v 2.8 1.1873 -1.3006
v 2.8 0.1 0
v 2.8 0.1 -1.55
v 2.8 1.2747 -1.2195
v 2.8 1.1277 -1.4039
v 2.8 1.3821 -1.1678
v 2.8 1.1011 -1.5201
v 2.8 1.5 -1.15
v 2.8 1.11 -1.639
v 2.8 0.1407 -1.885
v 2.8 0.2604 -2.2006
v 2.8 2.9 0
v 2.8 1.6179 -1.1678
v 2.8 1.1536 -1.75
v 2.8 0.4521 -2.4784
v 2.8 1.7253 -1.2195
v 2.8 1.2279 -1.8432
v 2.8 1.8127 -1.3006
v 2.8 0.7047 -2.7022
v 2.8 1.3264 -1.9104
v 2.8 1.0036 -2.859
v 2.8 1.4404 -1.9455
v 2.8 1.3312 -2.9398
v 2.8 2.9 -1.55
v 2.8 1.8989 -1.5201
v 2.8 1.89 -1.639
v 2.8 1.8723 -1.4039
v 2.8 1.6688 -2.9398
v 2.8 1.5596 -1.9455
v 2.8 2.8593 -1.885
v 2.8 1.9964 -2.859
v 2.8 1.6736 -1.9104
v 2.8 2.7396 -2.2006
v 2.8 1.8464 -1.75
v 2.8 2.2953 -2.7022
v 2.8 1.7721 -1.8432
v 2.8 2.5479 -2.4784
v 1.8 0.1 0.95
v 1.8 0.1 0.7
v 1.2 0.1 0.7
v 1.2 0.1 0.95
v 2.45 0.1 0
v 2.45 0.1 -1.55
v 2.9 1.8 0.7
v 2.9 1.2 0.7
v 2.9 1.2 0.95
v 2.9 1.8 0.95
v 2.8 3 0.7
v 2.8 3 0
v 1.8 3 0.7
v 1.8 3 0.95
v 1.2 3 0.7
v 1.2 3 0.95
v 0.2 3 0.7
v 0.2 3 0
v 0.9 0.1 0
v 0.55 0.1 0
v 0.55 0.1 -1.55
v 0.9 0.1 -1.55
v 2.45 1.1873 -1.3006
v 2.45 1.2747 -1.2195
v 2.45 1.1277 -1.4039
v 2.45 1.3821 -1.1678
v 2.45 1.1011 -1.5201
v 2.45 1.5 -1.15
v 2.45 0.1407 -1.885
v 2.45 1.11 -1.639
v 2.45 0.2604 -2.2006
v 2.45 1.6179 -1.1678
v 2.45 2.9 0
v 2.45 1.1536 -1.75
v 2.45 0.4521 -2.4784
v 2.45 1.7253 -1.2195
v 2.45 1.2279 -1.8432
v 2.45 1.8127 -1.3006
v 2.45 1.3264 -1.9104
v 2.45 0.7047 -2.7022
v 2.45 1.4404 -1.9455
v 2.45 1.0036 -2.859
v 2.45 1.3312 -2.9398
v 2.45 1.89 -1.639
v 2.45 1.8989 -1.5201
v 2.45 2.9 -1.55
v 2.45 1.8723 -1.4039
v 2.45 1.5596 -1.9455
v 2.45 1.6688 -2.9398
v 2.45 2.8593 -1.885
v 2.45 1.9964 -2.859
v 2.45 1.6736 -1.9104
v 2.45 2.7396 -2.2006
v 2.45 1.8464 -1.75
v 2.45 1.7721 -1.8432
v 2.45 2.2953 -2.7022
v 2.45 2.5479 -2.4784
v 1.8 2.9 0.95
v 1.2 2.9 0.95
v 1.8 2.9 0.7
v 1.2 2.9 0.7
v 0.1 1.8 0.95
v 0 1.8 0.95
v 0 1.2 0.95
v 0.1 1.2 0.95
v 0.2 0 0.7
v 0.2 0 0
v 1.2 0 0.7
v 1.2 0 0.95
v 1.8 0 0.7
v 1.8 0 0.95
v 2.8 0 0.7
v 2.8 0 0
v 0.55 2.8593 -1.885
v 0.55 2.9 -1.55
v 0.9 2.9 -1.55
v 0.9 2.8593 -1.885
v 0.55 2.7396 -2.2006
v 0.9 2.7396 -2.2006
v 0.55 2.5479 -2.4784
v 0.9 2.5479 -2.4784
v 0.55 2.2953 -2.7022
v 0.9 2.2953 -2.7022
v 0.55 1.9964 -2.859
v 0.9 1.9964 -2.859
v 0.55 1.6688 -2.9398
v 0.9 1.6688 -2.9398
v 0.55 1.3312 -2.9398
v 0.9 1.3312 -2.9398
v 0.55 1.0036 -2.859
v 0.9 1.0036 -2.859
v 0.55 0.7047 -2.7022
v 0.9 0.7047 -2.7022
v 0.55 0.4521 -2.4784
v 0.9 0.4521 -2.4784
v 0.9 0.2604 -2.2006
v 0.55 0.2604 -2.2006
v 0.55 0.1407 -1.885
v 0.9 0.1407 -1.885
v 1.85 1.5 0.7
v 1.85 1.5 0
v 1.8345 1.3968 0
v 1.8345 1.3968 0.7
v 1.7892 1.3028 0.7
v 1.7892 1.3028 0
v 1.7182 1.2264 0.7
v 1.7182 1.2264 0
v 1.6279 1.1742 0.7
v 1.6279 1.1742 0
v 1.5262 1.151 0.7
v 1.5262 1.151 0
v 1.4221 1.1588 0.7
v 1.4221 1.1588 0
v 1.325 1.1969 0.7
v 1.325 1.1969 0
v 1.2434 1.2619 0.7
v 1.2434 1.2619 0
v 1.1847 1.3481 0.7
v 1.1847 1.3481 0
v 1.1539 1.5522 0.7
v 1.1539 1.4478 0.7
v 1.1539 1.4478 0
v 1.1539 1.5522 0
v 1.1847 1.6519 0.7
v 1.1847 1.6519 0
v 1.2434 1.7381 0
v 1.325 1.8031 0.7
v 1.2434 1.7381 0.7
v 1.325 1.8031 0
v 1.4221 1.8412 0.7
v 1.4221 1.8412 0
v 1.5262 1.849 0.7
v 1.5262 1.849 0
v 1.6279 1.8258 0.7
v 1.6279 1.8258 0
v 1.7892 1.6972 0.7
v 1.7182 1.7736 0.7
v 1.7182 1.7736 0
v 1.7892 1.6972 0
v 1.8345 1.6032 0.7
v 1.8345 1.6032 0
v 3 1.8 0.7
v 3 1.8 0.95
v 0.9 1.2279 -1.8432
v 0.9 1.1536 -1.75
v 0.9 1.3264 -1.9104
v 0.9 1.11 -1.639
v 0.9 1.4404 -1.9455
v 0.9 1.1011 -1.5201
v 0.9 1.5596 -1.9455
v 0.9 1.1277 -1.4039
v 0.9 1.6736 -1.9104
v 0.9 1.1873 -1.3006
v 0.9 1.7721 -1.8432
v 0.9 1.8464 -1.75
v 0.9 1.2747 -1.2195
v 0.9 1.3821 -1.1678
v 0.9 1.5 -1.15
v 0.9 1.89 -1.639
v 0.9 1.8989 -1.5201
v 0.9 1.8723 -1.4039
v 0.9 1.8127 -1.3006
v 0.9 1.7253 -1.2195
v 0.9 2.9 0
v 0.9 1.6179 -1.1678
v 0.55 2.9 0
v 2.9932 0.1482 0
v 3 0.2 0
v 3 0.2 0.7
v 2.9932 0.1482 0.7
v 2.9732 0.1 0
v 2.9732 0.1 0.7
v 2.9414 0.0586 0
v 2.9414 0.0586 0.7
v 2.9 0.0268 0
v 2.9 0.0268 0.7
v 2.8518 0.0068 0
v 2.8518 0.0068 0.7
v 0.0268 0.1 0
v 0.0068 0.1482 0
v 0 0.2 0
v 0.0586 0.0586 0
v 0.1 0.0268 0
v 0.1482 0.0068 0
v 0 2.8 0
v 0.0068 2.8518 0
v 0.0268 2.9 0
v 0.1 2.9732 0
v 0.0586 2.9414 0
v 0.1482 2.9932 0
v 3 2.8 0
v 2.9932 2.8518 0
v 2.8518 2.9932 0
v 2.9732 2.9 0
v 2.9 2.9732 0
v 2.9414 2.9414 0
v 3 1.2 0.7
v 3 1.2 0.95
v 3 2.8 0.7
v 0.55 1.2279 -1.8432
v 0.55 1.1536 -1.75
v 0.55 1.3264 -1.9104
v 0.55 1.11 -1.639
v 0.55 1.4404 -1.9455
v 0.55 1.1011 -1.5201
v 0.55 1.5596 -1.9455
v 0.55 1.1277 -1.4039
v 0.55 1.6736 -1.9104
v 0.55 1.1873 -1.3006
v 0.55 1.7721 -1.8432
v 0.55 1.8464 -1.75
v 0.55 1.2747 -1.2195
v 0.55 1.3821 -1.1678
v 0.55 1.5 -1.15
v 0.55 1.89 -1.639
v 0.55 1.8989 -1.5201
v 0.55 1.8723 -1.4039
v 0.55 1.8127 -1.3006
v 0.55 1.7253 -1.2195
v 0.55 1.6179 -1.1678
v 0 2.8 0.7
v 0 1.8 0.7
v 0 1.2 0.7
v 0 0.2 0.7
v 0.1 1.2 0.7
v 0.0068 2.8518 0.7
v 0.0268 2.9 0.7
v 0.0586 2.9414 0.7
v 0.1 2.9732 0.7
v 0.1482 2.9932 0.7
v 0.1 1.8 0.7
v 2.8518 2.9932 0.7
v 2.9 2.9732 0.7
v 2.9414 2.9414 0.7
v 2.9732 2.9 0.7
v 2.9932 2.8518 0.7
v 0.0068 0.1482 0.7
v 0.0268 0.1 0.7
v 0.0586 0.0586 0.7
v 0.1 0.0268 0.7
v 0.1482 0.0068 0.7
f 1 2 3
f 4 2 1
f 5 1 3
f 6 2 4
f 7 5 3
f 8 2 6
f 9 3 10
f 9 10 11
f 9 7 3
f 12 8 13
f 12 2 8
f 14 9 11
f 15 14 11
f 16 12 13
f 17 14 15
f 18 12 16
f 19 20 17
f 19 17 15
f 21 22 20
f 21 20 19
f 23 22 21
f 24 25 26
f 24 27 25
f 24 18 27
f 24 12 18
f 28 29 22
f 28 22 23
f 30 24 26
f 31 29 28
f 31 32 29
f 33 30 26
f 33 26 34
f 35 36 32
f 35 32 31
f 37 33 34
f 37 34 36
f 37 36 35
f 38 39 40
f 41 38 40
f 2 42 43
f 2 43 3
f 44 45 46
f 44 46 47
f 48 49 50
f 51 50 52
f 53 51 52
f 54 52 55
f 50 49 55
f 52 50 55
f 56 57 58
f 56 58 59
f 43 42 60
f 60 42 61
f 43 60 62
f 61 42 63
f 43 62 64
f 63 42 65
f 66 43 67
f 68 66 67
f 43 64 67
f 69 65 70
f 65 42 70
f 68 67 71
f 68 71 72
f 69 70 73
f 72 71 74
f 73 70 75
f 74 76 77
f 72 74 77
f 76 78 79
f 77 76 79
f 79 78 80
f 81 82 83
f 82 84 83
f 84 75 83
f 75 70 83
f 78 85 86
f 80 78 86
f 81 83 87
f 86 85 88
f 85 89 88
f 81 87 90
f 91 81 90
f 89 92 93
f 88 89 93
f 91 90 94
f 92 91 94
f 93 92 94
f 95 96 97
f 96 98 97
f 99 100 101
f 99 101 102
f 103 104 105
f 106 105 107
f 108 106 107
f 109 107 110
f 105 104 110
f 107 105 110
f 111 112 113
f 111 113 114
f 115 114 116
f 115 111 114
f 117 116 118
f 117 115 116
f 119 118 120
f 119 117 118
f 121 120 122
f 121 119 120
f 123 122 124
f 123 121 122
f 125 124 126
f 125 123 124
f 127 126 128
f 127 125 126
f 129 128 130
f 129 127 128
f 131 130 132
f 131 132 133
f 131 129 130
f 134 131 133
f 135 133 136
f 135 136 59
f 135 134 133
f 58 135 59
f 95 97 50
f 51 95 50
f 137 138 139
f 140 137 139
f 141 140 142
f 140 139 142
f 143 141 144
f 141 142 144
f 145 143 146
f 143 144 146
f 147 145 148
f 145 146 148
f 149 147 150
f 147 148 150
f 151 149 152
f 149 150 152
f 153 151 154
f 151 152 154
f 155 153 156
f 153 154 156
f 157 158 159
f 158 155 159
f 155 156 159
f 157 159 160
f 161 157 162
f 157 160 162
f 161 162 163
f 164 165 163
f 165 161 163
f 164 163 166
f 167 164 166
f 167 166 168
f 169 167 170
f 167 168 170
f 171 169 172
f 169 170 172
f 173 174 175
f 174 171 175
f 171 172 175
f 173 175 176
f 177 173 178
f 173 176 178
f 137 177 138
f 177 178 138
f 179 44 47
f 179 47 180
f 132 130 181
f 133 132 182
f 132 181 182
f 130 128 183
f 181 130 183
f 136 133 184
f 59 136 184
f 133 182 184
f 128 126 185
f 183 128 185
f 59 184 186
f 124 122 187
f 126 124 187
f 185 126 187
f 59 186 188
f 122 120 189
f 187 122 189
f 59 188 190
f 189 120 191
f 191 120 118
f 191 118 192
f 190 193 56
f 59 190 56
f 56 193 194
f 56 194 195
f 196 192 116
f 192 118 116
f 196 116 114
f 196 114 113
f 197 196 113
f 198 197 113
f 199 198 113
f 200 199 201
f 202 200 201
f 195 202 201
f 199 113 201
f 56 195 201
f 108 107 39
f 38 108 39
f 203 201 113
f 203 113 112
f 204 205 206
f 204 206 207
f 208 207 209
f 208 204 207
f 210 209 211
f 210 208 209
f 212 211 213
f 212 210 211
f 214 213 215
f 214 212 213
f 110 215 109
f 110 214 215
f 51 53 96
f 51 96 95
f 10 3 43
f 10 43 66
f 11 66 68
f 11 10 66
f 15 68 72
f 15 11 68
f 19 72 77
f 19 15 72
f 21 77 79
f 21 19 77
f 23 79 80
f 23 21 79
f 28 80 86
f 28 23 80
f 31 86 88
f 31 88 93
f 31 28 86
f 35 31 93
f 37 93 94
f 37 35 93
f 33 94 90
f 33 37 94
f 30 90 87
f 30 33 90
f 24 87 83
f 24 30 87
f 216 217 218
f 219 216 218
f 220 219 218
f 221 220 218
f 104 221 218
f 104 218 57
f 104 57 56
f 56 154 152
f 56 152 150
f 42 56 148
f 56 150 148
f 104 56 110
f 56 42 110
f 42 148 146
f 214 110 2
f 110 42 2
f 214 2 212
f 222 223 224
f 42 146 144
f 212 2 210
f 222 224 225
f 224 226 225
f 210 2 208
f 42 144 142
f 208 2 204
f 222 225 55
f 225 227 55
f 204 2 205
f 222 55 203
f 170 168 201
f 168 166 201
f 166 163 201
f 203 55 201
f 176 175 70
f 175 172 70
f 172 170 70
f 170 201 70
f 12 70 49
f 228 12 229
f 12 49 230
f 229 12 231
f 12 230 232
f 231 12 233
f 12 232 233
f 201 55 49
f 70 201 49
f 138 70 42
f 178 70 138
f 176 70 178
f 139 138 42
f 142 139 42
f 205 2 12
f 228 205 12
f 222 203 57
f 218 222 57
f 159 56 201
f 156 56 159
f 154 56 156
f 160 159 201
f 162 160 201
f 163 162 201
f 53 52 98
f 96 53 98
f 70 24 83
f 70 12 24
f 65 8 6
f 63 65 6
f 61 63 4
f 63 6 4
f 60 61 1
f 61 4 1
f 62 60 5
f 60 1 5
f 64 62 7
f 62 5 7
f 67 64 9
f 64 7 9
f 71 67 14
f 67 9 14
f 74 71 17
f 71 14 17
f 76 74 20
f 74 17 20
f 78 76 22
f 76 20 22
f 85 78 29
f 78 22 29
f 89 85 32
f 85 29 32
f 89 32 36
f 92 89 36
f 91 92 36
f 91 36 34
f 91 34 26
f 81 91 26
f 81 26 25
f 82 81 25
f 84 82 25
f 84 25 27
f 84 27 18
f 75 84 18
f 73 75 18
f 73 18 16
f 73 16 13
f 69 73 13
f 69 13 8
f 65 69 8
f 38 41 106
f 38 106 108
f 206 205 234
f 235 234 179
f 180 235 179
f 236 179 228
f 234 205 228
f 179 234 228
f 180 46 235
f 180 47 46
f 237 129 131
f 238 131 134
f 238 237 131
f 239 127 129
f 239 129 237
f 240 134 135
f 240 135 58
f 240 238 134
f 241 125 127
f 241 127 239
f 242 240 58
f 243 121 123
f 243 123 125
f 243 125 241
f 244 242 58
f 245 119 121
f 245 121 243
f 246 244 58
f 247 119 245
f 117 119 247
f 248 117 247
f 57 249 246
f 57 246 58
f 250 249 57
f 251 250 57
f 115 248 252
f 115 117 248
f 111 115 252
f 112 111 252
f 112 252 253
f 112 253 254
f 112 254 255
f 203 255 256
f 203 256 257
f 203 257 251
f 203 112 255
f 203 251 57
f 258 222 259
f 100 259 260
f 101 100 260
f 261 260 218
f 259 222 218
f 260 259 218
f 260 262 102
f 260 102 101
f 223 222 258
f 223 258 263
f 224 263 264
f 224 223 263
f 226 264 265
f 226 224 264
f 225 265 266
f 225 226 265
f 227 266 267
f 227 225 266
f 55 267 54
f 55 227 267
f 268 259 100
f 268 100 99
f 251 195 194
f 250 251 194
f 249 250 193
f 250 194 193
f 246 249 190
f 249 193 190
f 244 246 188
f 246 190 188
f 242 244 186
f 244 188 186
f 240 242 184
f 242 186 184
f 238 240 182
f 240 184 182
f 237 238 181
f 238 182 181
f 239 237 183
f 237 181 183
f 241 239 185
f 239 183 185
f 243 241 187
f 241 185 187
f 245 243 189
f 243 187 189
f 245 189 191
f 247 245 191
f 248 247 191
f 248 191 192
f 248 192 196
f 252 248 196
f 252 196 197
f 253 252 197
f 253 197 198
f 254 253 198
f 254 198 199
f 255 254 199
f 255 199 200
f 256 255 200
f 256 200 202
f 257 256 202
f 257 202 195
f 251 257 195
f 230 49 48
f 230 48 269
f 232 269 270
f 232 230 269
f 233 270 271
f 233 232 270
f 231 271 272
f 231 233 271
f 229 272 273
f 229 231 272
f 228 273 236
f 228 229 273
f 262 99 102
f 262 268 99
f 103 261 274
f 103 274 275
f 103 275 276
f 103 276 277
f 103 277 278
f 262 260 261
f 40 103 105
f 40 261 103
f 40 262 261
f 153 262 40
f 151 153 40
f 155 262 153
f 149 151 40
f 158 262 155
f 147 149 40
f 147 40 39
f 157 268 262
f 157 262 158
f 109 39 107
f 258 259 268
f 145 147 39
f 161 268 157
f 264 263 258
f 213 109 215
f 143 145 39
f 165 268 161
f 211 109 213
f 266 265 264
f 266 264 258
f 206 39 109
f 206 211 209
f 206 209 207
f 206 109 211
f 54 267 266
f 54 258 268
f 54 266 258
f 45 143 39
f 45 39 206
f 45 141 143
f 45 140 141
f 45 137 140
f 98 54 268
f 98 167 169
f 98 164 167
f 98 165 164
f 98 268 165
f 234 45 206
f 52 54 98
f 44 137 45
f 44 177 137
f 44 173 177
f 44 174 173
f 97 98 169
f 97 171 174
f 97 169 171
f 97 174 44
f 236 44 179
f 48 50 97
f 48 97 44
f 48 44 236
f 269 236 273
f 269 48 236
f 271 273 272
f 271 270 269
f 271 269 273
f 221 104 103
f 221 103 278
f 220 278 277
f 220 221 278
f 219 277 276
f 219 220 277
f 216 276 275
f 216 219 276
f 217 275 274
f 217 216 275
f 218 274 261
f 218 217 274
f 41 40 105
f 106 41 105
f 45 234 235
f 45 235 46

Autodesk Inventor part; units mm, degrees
ref_plane "YZ Plane" through (0, 0, 0) normal (1, 0, 0) x (0, 1, 0)
ref_plane "XZ Plane" through (0, 0, 0) normal (0, 1, 0) x (-1, 0, 0)
ref_plane "XY Plane" through (0, 0, 0) normal (0, 0, 1) x (1, 0, 0)
sketch "Skizze1" plane through (0, 0, 0) normal (0, 0, 1) x (1, 0, 0)
  line L0 (0.2, 0) -> (2.8, 0)
  line L1 (3, 0.2) -> (3, 2.8)
  line L2 (2.8, 3) -> (0.2, 3)
  line L3 (0, 2.8) -> (0, 0.2)
  arc A0 (0.2, 3) -> (0, 2.8) centre (0.2, 2.8) ccw
  arc A1 (3, 2.8) -> (2.8, 3) centre (2.8, 2.8) ccw
  arc A2 (2.8, 0) -> (3, 0.2) centre (2.8, 0.2) ccw
  arc A3 (0, 0.2) -> (0.2, 0) centre (0.2, 0.2) ccw
  line L4 (0, 1.5) -> (3, 1.5) construction
  line L5 (1.5, 3) -> (1.5, 0) construction
  circle A4 centre (1.5, 1.5) radius 0.35
  point P0 (0, 0)
  point P1 (3, 3)
  point P2 (3, 0)
  point P3 (0, 3)
  dimension "d0" = 3
  dimension "d1" = 3
  dimension "d2" = 0.2
  dimension "d3" = 0.7
extrude "Extrusion1" add sketch "Skizze1" along normal blind 0.7
sketch "Skizze2" plane through (0, 0, 0.7) normal (0, 0, 1) x (1, 0, 0)
  circle A0 centre (1.5, 1.5) radius 0.35 construction
  line L0 (2.8, 3) -> (0.2, 3) construction
  arc A1 (0.2, 3) -> (0, 2.8) centre (0.2, 2.8) ccw construction
  line L1 (0, 2.8) -> (0, 0.2) construction
  arc A2 (0, 0.2) -> (0.2, 0) centre (0.2, 0.2) ccw construction
  line L2 (0.2, 0) -> (2.8, 0) construction
  arc A3 (2.8, 0) -> (3, 0.2) centre (2.8, 0.2) ccw construction
  line L3 (3, 0.2) -> (3, 2.8) construction
  arc A4 (3, 2.8) -> (2.8, 3) centre (2.8, 2.8) ccw construction
  line L4 (0, 2.8) -> (0, 0.2) projected
  line L5 (0, 1.8) -> (0.1, 1.8)
  line L6 (0.1, 1.8) -> (0.1, 1.2)
  line L7 (0.1, 1.2) -> (0, 1.2)
  line L8 (0, 1.2) -> (0, 1.8)
  line L9 (0.2, 0) -> (2.8, 0) projected
  line L10 (1.2, 0) -> (1.8, 0)
  line L11 (1.8, 0) -> (1.8, 0.1)
  line L12 (1.8, 0.1) -> (1.2, 0.1)
  line L13 (1.2, 0.1) -> (1.2, 0)
  line L14 (3, 0.2) -> (3, 2.8) projected
  line L15 (3, 1.2) -> (2.9, 1.2)
  line L16 (2.9, 1.2) -> (2.9, 1.8)
  line L17 (2.9, 1.8) -> (3, 1.8)
  line L18 (3, 1.8) -> (3, 1.2)
  line L19 (0.2, 3) -> (2.8, 3) projected
  line L20 (1.8, 3) -> (1.2, 3)
  line L21 (1.2, 3) -> (1.2, 2.9)
  line L22 (1.2, 2.9) -> (1.8, 2.9)
  line L23 (1.8, 2.9) -> (1.8, 3)
  point P0 (0, 0)
  point P1 (0, 1.5)
  point P2 (1.5, 3)
  point P3 (3, 1.5)
  point P4 (1.5, 0)
  dimension "d6" = 0.6
  dimension "d7" = 0.1
  dimension "d8" = 0.6
  dimension "d9" = 0.6
  dimension "d10" = 0.6
  dimension "d11" = 0.1
  dimension "d12" = 0.1
  dimension "d13" = 0.1
extrude "Extrusion2" add sketch "Skizze2" along normal blind 0.25
sketch "Skizze3" plane through (0, 0, 0) normal (0, 0, -1) x (-1, 0, 0)
  circle A0 centre (-1.5, 1.5) radius 0.35 construction
  line L0 (-0.2, 3) -> (-2.8, 3) construction
  arc A1 (-2.8, 3) -> (-3, 2.8) centre (-2.8, 2.8) ccw construction
  line L1 (-3, 2.8) -> (-3, 0.2) construction
  arc A2 (-3, 0.2) -> (-2.8, 0) centre (-2.8, 0.2) ccw construction
  line L2 (-2.8, 0) -> (-0.2, 0) construction
  arc A3 (-0.2, 0) -> (0, 0.2) centre (-0.2, 0.2) ccw construction
  line L3 (0, 0.2) -> (0, 2.8) construction
  arc A4 (0, 2.8) -> (-0.2, 3) centre (-0.2, 2.8) ccw construction
  line L4 (-2.8, 2.9) -> (-2.45, 2.9)
  line L5 (-2.45, 2.9) -> (-2.45, 0.1)
  line L6 (-2.45, 0.1) -> (-2.8, 0.1)
  line L7 (-2.8, 0.1) -> (-2.8, 2.9)
  line L8 (-0.9, 2.9) -> (-0.55, 2.9)
  line L9 (-0.55, 2.9) -> (-0.55, 0.1)
  line L10 (-0.55, 0.1) -> (-0.9, 0.1)
  line L11 (-0.9, 0.1) -> (-0.9, 2.9)
  line L12 (-3, 1.5) -> (0, 1.5) construction
  point P0 (0, 0)
  point P1 (-2.8, 1.5)
  dimension "d16" = 0.35
  dimension "d17" = 0.35
  dimension "d18" = 2.8
  dimension "d19" = 0.2
  dimension "d20" = 0.55
extrude "Extrusion3" add sketch "Skizze3" along normal blind 1.55
sketch "Skizze4" plane through (2.8, 0.1, 0) normal (1, 0, 0) x (0, 0, -1)
  line L0 (1.55, 2.8) -> (1.55, 0) projected
  line L1 (1.55, 2.8) -> (1.55, 0) construction
  arc A0 (1.55, 0) -> (1.55, 2.8) centre (1.55, 1.4) ccw
  point P0 (0, -0.1)
extrude "Extrusion4" add sketch "Skizze4" against normal blind 0.35
sketch "Skizze5" plane through (0.55, 0.1, 0) normal (-1, 0, 0) x (0, 0, 1)
  line L0 (-1.55, 0) -> (-1.55, 2.8) projected
  arc A0 (-1.55, 2.8) -> (-1.55, 0) centre (-1.55, 1.4) ccw projected
  point P0 (0, -0.1)
extrude "Extrusion5" add sketch "Skizze5" against normal blind 0.35
sketch "Skizze6" plane through (0.55, 0.1, 0) normal (-1, 0, 0) x (0, 0, 1)
  arc A0 (-1.55, 2.8) -> (-1.55, 0) centre (-1.55, 1.4) ccw construction
  point P0 (0, -0.1)
hole "Bohrung1" at (0.55, 1.5, -1.55) direction (1, 0, 0) diameter 0.8 end through all
properties part number "item_gelenk_teil_komplett"
